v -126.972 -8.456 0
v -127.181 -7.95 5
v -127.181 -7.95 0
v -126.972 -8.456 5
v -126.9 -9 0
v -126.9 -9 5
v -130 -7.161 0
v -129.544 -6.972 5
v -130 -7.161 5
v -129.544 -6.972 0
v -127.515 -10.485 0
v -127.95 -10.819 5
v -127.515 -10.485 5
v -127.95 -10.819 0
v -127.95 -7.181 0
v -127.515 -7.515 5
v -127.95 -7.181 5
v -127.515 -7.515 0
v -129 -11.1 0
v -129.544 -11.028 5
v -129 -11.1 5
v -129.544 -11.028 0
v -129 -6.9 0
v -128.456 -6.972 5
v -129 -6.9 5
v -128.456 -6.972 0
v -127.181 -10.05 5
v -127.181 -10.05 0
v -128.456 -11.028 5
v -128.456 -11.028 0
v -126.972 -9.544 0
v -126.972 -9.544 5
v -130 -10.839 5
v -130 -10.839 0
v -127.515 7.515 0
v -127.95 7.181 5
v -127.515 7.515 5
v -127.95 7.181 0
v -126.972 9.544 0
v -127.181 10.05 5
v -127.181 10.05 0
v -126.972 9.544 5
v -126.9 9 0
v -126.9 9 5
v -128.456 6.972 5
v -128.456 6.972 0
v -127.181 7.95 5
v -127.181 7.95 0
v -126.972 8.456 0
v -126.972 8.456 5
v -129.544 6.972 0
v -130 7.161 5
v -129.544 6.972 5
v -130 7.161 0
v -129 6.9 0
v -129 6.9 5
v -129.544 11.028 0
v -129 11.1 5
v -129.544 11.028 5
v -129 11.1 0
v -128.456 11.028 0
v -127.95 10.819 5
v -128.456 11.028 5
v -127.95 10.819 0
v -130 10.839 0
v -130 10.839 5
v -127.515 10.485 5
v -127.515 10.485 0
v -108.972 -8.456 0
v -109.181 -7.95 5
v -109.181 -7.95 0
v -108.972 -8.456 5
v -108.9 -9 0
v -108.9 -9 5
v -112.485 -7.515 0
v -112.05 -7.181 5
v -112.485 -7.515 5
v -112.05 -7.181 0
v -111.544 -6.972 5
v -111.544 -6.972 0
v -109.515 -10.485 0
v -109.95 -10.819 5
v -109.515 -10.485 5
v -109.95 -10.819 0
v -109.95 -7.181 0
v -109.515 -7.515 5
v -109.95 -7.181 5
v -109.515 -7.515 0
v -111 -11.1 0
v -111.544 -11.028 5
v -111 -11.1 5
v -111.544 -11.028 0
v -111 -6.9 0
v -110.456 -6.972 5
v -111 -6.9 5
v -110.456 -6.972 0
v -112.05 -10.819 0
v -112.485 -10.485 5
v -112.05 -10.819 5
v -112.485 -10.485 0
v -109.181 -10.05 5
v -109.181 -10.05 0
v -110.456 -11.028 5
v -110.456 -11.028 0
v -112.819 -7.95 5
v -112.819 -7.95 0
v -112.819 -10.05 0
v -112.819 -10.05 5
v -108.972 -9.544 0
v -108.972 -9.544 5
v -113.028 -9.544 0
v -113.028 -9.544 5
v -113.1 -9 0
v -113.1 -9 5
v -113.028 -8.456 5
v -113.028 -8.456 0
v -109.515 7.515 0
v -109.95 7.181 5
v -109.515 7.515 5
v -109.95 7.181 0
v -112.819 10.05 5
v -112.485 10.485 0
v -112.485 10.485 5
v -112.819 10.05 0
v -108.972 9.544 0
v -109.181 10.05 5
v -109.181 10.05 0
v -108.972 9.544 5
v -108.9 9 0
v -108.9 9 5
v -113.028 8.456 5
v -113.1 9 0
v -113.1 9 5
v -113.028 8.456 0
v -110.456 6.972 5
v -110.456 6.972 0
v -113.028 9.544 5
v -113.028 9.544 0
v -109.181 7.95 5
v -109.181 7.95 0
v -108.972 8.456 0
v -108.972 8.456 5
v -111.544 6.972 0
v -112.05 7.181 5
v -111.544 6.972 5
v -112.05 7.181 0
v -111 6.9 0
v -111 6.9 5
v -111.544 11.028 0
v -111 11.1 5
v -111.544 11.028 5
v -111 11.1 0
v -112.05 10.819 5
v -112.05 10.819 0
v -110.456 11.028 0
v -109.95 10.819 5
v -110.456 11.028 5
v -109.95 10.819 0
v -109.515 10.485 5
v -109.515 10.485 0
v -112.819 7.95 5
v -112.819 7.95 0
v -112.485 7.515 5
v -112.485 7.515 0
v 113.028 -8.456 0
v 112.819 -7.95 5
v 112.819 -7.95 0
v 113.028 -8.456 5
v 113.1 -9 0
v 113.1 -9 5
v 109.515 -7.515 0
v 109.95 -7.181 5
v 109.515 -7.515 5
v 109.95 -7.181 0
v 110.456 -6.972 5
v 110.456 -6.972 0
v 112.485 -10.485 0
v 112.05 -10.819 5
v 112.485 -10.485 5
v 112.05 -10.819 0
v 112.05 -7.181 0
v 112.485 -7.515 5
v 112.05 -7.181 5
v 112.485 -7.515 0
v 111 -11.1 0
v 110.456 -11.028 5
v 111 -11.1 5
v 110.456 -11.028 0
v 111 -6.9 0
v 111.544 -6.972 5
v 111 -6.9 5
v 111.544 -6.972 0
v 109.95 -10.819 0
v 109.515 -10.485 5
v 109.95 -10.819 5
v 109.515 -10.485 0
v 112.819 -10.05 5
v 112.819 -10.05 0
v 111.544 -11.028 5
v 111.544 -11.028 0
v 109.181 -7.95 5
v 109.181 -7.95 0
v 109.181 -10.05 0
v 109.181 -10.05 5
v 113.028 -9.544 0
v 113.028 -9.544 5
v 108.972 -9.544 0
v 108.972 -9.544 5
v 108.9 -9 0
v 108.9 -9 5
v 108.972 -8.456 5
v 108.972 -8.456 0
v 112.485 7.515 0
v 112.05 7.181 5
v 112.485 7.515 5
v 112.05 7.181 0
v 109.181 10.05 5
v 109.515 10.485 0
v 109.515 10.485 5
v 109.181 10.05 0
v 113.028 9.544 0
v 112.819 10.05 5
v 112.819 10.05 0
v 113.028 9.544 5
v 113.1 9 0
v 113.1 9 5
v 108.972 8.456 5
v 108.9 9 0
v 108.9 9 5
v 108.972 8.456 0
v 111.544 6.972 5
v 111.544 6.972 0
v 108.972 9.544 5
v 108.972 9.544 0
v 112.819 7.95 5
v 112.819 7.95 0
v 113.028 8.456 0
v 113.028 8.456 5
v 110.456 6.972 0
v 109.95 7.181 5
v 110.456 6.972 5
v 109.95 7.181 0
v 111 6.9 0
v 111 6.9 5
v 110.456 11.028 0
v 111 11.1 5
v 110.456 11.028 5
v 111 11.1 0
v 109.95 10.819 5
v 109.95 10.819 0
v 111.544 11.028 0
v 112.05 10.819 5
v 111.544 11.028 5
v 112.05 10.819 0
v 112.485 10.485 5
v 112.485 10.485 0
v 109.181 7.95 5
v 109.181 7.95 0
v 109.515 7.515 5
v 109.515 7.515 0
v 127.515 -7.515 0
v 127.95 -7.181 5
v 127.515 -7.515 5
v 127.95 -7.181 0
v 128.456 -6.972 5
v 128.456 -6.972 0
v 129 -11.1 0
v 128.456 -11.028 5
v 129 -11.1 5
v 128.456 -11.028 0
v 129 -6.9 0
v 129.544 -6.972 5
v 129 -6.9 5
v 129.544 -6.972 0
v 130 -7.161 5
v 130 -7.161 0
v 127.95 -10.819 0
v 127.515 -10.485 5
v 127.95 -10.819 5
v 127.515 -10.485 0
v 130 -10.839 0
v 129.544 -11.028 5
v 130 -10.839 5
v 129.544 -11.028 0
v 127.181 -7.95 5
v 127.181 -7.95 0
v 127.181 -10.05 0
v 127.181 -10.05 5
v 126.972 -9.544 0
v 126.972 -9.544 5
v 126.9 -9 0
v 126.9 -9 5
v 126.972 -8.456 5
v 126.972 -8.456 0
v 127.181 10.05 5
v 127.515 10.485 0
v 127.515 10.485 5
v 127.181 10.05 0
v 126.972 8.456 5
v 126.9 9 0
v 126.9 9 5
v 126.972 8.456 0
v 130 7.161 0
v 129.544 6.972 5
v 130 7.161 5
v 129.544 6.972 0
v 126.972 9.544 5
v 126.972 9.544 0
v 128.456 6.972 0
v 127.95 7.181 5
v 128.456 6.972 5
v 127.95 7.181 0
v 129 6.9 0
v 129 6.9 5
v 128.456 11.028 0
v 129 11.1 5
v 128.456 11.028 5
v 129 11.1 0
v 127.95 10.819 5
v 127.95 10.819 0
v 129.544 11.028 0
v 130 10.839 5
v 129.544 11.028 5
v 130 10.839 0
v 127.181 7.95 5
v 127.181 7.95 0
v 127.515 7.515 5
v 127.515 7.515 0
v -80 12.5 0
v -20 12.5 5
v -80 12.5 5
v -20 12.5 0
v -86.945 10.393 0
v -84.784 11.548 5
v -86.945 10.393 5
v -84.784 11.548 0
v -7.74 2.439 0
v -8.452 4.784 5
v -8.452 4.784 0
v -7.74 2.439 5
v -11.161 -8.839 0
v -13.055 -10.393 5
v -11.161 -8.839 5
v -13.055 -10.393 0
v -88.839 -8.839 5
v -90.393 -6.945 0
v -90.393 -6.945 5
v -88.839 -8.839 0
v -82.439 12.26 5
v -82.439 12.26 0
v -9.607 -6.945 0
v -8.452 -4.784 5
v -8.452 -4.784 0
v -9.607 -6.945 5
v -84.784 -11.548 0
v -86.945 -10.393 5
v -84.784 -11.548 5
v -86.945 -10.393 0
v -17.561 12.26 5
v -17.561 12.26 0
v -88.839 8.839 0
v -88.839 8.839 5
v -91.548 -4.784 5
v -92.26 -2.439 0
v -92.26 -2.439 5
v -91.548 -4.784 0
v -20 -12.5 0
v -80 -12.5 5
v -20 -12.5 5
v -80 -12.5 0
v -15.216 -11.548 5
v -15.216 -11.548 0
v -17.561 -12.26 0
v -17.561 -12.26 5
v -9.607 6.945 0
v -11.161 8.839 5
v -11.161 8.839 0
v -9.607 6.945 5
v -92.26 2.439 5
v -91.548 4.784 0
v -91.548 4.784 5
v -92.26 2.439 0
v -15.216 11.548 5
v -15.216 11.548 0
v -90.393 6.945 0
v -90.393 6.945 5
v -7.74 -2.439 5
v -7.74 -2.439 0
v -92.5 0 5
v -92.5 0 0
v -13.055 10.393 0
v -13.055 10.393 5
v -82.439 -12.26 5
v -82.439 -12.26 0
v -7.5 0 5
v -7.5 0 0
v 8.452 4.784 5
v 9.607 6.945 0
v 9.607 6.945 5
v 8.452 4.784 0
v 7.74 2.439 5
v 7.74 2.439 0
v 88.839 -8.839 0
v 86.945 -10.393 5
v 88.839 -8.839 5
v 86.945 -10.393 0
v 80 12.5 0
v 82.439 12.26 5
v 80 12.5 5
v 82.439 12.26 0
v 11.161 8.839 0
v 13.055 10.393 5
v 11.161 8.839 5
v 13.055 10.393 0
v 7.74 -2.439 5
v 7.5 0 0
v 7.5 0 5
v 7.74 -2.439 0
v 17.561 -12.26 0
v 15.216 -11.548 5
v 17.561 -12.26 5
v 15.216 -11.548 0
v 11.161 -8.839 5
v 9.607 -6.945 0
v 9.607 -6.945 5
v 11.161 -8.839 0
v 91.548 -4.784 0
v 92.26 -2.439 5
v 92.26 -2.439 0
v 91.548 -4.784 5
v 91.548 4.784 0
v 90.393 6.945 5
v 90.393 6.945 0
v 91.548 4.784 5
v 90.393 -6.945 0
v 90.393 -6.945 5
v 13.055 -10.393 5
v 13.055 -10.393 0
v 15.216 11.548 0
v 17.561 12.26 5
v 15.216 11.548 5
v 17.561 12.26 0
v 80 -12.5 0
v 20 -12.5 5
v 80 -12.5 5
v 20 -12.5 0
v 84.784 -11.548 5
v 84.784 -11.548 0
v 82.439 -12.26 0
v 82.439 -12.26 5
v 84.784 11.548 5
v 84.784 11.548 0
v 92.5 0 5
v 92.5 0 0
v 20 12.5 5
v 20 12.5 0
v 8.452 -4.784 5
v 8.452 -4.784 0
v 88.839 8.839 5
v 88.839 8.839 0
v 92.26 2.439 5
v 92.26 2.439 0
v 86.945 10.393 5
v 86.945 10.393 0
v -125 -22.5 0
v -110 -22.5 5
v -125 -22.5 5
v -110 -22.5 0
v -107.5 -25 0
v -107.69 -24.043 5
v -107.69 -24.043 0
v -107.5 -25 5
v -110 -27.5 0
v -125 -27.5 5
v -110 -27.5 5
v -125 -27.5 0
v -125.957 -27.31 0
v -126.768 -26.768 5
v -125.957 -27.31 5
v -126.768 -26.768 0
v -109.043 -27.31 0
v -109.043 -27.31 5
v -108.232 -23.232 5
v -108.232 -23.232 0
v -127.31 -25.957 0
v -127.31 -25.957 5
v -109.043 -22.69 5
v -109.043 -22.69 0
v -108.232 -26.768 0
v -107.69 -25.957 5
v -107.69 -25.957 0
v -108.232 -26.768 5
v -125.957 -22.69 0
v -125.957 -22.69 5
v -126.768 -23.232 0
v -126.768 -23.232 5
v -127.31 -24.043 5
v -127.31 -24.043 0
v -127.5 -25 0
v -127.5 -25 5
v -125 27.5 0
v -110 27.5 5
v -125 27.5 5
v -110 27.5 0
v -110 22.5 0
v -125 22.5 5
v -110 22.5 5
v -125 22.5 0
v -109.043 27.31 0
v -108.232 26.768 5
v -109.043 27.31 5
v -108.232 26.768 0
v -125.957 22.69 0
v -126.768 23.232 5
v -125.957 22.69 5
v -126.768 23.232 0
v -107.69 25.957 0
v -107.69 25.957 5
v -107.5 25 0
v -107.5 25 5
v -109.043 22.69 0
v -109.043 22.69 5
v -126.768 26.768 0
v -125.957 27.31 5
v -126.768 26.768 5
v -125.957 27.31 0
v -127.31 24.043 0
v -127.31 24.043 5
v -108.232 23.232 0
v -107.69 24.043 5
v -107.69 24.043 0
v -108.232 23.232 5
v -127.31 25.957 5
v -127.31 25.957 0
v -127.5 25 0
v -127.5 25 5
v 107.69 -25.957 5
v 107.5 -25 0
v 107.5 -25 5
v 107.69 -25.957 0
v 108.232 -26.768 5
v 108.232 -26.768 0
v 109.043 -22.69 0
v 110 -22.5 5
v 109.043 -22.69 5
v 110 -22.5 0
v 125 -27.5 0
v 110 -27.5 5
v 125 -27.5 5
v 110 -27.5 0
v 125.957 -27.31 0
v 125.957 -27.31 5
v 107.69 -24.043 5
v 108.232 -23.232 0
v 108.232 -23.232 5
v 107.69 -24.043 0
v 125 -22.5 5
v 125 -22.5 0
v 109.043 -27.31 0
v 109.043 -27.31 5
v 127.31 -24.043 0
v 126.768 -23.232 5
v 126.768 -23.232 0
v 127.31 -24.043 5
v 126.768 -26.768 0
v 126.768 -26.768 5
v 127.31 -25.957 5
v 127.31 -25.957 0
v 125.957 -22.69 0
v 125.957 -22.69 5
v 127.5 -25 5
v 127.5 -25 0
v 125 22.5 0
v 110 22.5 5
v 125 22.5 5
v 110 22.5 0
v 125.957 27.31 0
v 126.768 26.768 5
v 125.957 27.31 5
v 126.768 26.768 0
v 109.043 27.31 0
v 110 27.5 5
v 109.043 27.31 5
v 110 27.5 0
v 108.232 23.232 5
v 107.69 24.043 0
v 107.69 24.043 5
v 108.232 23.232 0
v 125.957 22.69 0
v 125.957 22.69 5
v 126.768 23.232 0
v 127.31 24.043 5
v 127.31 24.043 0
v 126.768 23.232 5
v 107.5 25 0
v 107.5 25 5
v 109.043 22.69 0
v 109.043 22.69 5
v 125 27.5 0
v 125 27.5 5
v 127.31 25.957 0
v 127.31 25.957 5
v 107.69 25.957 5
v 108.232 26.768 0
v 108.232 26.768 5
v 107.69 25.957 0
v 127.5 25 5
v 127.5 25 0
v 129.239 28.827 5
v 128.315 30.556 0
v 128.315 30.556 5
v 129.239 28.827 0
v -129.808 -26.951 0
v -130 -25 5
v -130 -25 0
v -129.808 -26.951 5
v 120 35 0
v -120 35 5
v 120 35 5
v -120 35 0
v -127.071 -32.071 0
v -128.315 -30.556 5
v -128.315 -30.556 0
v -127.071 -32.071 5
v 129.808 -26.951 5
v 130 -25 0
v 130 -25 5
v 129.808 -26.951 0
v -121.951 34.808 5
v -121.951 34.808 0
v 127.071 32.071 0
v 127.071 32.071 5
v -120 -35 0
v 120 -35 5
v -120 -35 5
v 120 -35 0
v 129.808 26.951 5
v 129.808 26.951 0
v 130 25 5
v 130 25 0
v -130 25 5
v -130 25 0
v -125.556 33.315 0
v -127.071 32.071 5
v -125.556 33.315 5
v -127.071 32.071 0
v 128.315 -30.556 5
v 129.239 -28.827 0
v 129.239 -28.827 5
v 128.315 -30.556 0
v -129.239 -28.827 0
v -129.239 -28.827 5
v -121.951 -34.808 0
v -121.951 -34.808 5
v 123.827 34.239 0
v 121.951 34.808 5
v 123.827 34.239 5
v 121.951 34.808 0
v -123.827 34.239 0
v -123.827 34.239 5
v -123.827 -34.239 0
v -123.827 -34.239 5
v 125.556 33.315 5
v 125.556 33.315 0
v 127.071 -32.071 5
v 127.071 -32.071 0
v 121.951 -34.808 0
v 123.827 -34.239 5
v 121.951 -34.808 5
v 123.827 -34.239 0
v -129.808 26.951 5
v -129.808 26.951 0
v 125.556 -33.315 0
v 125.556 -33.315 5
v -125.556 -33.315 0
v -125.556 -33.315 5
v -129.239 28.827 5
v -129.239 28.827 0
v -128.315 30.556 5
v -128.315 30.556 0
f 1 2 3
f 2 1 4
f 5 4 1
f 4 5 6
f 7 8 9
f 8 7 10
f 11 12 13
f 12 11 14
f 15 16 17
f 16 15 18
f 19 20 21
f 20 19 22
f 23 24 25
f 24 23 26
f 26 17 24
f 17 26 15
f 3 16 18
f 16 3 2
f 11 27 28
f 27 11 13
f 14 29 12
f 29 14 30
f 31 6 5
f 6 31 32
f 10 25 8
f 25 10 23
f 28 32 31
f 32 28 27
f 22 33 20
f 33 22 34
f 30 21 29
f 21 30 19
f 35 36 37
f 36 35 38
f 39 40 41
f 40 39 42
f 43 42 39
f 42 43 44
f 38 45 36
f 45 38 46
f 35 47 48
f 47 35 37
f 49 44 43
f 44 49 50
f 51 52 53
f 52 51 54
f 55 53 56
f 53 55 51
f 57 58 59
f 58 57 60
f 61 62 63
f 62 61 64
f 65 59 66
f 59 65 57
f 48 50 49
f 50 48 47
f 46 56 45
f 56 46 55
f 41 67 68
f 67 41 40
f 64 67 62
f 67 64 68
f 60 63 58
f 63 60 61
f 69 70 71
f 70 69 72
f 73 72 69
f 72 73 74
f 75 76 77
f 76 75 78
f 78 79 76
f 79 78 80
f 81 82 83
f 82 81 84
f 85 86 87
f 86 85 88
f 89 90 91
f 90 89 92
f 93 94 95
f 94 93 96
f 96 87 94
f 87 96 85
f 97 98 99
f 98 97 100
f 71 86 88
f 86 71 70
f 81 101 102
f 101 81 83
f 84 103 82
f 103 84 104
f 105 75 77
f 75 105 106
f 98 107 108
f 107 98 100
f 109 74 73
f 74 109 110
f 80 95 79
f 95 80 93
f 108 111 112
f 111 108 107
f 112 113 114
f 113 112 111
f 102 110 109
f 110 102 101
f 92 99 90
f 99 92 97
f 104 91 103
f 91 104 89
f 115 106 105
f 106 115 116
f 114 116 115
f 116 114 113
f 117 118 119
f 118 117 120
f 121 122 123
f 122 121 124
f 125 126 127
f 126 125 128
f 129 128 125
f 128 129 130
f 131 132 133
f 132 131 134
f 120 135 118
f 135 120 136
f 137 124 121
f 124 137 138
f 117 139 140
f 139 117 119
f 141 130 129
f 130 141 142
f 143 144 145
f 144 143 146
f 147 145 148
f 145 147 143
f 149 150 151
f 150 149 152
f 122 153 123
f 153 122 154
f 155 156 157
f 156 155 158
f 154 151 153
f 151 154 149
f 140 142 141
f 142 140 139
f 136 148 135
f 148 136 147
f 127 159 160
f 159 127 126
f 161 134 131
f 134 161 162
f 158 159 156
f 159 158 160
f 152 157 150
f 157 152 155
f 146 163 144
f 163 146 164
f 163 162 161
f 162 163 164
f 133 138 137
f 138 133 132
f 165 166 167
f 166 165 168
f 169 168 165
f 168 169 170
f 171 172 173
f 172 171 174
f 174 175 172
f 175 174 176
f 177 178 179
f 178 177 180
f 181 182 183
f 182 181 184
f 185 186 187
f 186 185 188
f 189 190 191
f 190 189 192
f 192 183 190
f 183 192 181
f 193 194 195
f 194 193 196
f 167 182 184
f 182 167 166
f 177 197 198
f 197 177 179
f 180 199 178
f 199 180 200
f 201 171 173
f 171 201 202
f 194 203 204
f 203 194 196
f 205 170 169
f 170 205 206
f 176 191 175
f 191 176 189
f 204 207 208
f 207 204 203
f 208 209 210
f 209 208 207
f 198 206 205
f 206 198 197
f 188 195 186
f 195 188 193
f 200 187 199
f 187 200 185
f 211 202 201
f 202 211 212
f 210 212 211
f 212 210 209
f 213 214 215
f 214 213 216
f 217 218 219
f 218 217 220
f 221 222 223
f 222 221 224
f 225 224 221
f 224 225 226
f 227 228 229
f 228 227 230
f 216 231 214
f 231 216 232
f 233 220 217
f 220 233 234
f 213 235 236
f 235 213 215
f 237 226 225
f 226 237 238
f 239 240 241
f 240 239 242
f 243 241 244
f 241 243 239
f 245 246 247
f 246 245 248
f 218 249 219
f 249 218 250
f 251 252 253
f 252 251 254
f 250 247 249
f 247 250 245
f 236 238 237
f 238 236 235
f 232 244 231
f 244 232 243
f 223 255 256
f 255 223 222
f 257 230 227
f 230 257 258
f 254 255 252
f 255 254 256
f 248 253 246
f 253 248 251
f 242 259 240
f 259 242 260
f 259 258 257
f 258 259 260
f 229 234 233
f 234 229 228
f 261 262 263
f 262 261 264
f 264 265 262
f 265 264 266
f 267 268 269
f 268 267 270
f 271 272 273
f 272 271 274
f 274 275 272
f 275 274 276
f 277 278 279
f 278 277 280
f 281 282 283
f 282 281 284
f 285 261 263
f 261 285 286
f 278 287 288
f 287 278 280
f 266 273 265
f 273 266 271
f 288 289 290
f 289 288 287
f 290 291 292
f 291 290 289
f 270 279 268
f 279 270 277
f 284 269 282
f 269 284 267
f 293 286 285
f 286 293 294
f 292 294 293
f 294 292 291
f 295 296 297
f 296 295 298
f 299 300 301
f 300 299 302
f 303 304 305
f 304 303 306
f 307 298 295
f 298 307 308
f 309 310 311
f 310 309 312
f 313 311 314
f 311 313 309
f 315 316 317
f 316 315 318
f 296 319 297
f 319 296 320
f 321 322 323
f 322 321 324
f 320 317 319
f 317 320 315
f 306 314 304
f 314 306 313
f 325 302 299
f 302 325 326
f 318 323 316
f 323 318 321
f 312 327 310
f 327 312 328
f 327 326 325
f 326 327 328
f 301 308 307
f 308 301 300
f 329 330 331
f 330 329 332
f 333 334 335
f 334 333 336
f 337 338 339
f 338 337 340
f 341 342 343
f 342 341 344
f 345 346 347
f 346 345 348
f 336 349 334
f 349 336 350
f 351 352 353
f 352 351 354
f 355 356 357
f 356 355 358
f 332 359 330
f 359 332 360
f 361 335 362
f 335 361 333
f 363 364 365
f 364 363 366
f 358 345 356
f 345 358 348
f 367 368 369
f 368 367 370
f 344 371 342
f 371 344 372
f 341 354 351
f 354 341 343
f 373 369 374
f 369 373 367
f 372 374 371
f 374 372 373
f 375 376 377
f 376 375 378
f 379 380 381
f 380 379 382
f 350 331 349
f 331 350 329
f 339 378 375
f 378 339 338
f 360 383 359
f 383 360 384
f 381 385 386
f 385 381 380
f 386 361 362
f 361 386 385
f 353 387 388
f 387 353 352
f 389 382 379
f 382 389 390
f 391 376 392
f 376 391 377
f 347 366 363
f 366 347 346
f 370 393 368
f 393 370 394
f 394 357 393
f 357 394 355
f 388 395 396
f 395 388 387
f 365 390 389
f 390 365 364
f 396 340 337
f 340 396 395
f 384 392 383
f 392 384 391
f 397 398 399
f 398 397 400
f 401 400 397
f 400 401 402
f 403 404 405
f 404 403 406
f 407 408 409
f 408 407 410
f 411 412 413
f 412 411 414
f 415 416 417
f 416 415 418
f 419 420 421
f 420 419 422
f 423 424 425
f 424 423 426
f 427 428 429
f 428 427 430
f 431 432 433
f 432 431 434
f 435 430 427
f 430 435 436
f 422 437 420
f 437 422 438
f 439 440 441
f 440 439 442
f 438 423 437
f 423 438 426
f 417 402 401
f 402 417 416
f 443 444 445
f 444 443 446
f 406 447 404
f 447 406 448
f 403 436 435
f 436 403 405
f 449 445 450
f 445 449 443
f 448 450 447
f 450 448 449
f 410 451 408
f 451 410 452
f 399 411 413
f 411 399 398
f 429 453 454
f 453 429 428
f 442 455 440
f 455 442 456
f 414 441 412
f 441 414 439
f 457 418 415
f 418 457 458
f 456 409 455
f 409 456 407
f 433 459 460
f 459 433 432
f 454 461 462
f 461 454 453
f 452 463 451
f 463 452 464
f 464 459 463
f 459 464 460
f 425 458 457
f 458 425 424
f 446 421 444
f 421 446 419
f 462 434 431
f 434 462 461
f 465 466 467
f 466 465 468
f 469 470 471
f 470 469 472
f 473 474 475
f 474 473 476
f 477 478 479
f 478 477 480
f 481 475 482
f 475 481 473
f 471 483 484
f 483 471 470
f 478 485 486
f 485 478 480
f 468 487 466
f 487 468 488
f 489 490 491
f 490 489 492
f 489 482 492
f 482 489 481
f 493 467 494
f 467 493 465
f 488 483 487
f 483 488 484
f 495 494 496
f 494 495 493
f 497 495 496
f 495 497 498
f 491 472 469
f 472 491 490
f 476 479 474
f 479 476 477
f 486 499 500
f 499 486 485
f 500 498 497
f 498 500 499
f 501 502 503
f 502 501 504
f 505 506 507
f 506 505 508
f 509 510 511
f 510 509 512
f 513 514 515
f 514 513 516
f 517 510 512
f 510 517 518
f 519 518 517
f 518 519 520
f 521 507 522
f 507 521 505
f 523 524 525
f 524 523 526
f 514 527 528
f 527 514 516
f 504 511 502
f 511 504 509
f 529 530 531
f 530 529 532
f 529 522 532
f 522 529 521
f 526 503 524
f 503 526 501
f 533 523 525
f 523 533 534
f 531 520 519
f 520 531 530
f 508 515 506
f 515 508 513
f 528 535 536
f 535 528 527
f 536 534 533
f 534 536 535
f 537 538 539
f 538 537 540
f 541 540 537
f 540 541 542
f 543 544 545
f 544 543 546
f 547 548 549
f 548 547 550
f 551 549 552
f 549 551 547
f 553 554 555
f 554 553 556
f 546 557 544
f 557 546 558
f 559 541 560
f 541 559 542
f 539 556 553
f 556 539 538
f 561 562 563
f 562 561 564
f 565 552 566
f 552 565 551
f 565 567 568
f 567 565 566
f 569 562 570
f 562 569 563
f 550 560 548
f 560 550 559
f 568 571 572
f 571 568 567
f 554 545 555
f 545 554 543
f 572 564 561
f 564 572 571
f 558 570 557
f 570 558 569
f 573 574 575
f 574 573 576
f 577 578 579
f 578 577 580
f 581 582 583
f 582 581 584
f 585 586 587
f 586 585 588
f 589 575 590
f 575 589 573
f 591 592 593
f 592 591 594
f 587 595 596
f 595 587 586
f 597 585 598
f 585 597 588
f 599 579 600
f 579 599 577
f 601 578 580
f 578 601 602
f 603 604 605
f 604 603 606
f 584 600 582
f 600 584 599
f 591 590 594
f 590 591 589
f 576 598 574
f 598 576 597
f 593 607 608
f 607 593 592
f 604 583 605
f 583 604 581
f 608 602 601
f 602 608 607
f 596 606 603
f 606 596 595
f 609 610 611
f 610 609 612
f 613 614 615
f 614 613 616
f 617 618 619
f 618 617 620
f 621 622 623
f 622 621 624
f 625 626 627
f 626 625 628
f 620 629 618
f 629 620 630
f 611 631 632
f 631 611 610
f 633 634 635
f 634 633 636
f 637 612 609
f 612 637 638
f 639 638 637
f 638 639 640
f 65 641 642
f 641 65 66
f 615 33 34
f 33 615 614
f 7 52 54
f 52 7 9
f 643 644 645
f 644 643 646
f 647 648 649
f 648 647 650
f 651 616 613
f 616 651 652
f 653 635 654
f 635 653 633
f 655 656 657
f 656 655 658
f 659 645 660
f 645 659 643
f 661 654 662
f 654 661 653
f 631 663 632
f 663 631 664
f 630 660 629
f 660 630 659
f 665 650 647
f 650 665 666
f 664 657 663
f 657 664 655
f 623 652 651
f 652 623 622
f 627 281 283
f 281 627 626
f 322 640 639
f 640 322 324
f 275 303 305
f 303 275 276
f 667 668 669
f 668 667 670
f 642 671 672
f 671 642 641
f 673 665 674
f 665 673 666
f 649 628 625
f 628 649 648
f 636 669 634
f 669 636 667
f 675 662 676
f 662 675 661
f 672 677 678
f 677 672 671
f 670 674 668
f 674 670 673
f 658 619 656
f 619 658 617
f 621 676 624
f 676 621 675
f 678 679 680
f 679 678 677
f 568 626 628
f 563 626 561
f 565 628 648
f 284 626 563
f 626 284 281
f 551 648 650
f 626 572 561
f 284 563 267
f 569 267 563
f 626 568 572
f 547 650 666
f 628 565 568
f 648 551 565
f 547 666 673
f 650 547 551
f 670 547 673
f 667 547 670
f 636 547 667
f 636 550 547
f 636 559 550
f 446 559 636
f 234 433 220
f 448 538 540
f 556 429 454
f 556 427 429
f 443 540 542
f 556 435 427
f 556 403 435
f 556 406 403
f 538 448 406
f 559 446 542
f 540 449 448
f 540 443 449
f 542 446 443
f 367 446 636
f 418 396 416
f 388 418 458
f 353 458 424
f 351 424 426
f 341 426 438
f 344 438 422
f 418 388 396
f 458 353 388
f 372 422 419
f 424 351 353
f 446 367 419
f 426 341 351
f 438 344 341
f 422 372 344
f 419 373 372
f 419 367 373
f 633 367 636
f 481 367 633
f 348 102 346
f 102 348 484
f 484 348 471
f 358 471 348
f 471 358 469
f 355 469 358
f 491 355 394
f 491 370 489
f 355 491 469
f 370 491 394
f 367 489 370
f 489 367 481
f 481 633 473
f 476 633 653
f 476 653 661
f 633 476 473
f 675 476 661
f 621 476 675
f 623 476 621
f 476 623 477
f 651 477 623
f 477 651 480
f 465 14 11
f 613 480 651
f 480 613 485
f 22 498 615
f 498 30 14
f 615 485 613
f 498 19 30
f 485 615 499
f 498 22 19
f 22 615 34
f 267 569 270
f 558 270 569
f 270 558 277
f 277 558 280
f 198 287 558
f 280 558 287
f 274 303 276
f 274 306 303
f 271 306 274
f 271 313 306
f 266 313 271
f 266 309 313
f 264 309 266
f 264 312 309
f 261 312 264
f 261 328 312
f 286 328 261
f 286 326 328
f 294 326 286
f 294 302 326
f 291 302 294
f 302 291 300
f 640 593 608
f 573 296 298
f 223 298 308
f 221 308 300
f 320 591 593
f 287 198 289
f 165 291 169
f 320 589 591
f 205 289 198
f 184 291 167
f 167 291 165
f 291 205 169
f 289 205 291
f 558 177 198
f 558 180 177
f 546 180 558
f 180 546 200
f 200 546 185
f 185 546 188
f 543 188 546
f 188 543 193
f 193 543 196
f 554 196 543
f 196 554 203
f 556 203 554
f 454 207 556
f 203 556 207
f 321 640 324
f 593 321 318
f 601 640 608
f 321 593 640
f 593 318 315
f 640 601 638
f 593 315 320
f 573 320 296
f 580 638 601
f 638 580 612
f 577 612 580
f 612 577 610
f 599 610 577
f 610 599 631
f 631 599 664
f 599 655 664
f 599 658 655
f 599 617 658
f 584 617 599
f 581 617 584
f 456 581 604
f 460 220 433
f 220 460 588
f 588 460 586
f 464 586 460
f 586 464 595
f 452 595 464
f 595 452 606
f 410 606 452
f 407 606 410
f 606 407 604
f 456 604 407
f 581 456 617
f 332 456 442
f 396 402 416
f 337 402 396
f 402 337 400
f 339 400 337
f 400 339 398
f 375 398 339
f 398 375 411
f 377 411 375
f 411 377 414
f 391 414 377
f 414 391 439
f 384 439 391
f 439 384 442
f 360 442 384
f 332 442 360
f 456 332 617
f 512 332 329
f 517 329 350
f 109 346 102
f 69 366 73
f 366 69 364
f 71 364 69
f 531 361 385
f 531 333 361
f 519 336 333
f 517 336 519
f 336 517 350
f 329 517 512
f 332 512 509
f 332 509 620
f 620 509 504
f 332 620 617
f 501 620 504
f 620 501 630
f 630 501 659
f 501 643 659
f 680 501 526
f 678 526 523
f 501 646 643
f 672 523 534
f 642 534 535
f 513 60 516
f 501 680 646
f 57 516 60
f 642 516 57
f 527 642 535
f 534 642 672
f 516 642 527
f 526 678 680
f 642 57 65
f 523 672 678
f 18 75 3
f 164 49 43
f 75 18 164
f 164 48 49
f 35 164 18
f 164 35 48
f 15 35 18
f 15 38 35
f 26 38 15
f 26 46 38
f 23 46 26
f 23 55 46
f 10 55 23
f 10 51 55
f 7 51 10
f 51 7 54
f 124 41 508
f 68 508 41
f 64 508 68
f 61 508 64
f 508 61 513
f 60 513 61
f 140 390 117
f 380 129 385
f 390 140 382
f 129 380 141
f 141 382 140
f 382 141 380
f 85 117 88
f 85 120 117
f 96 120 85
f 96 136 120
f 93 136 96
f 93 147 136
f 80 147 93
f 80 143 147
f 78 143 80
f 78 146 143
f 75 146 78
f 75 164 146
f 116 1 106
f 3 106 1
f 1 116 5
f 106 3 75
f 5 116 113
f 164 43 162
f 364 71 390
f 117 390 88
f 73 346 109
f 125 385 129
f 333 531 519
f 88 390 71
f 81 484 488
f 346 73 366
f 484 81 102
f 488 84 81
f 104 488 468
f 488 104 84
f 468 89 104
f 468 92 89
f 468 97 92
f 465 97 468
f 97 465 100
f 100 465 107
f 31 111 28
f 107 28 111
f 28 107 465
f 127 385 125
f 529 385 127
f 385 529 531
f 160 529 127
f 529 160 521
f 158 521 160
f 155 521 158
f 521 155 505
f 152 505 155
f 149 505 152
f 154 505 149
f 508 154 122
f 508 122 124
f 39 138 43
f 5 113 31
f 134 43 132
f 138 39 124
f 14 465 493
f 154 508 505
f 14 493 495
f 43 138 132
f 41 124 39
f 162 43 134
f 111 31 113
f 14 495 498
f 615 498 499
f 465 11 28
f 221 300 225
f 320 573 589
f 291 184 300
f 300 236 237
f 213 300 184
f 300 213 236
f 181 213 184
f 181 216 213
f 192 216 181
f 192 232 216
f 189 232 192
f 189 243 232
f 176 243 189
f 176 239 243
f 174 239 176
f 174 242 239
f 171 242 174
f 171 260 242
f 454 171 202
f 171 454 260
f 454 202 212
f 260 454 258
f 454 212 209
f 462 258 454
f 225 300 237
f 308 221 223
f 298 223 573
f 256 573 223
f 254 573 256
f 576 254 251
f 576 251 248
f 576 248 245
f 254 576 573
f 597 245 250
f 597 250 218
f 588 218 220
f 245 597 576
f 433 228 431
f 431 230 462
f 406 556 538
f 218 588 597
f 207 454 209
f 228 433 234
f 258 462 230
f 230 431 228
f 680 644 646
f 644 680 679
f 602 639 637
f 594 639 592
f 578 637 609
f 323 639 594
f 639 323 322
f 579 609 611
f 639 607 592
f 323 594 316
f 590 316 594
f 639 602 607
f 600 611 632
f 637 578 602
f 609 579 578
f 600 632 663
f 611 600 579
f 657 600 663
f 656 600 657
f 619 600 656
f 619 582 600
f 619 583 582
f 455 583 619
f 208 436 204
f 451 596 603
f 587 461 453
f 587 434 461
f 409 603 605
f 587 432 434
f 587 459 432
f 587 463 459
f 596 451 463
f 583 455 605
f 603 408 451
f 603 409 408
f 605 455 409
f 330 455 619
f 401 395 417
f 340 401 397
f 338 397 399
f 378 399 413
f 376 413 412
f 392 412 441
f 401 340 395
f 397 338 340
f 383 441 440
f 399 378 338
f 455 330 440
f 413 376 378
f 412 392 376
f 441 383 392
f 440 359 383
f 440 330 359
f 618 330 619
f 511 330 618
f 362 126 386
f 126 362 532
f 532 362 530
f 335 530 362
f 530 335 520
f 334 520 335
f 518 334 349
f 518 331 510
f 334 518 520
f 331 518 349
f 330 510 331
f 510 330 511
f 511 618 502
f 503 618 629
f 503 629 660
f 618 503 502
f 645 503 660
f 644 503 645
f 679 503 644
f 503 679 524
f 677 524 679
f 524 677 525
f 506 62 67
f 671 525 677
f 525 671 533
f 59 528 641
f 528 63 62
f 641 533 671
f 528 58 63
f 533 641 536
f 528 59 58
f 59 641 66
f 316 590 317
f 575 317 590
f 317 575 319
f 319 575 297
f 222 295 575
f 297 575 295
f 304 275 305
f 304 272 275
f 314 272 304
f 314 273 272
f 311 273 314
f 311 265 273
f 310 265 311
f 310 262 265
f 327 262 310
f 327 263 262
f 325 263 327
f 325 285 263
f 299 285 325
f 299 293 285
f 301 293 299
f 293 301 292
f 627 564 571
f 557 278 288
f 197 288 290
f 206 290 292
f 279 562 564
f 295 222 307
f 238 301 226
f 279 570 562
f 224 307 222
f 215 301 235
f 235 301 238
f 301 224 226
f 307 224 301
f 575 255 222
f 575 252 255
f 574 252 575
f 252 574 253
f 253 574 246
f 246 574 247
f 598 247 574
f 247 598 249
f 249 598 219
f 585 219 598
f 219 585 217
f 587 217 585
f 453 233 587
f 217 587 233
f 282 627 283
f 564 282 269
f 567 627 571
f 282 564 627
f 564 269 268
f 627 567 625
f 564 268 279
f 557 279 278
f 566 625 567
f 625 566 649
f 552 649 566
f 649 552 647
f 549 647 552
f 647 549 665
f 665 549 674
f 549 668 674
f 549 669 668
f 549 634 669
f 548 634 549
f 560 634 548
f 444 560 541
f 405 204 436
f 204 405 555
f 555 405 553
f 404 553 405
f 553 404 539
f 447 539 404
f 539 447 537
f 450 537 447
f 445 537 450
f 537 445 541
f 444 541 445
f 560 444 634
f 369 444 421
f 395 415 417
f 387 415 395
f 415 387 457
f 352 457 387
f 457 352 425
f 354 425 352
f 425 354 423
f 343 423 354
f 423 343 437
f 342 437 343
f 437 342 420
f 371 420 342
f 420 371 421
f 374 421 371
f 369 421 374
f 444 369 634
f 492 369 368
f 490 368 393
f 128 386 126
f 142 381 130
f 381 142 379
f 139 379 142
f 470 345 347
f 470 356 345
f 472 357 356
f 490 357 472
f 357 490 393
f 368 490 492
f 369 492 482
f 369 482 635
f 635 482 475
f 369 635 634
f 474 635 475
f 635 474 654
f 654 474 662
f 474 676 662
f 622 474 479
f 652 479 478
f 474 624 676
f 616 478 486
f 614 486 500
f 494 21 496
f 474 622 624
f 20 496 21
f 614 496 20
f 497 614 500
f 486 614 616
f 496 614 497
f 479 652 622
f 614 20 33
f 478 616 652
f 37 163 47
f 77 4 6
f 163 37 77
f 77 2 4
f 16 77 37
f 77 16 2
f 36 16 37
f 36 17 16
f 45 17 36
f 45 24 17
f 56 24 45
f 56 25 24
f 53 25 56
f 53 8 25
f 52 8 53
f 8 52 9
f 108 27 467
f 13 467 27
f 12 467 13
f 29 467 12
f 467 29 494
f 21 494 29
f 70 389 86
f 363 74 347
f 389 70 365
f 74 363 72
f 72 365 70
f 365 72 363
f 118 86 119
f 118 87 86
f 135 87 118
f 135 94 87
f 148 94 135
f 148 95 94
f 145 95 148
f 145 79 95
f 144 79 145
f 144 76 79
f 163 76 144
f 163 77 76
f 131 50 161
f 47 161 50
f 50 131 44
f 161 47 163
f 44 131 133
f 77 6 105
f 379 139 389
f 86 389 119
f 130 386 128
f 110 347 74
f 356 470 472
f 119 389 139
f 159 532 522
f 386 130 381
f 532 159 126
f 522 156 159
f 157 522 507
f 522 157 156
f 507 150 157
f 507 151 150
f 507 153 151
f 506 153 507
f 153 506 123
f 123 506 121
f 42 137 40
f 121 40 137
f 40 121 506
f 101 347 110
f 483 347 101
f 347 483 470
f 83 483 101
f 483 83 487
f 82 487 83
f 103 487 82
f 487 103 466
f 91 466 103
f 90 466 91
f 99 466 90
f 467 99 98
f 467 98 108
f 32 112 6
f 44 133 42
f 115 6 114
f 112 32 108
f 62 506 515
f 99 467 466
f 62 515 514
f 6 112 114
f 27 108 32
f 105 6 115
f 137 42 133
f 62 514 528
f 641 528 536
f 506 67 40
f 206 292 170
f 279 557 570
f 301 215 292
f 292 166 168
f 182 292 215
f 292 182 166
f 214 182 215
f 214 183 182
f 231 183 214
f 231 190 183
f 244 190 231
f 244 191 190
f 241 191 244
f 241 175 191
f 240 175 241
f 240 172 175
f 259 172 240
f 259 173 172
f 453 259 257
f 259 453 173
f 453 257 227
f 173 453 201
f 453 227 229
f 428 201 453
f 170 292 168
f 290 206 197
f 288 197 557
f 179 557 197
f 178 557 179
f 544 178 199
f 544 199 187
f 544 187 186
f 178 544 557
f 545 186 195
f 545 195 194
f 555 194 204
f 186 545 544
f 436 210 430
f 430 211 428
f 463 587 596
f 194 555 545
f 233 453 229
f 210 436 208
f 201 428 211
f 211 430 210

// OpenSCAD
// file: ../common.scad
/*
 * WAVE OCEAN V10 - TWISTED CAM SYSTEM
 * COMMON PARAMETERS
 *
 * Simplified mechanism: slats rest on cam surface, no follower arms
 * Single helical ridge creates traveling wave as cam rotates
 *
 * All dimensions in mm
 */

// ============================================
// PRINT TOLERANCES (tune for your printer)
// ============================================

TOL_CLEARANCE = 0.2;         // Shaft in hole clearance
TOL_PRESS_FIT = -0.15;       // Bearing press-fit interference
TOL_SLIDING = 0.3;           // Sliding fit (slats in guides)

// ============================================
// HARDWARE - BEARINGS
// ============================================

// 608 bearing (main shaft) - common, cheap
BEARING_608_ID = 8;
BEARING_608_OD = 22;
BEARING_608_H = 7;

// ============================================
// HARDWARE - FASTENERS
// ============================================

M3_HOLE = 3.2;
M3_HEAD_DIA = 5.5;
M3_HEAD_H = 3;
M4_HOLE = 4.2;

// ============================================
// MAIN SHAFT
// ============================================

SHAFT_DIA = 8;                   // 8mm steel rod
SHAFT_LENGTH = 260;              // Total shaft length
SHAFT_HOLE = SHAFT_DIA + TOL_CLEARANCE;  // 8.2mm

// ============================================
// TWISTED CAM DIMENSIONS
// ============================================

CAM_LENGTH = 200;                // Active wave zone
CAM_CORE_RADIUS = 12;            // Base cylinder radius
CAM_RIDGE_HEIGHT = 10;           // How much ridge sticks out
CAM_RIDGE_WIDTH = 8;             // Width of ridge (smoothness)
CAM_MAX_RADIUS = CAM_CORE_RADIUS + CAM_RIDGE_HEIGHT;  // 22mm

// Helix parameters
HELIX_TURNS = 2;                 // Number of complete spirals
HELIX_PITCH = CAM_LENGTH / HELIX_TURNS;  // 100mm per turn

// ============================================
// SLAT DIMENSIONS
// ============================================

NUM_SLATS = 24;
SLAT_SPACING = CAM_LENGTH / NUM_SLATS;  // 8.33mm

SLAT_WIDTH = 6;                  // X dimension (along cam axis)
SLAT_DEPTH = 30;                 // Y dimension (front to back)
SLAT_HEIGHT = 50;                // Z dimension (wave visual height)

// Slat bottom - curved to nest on cam surface
SLAT_CURVE_RADIUS = CAM_CORE_RADIUS + 2;  // Slightly larger than core

// Wave motion
WAVE_AMPLITUDE = CAM_RIDGE_HEIGHT;  // Total Z travel = ridge height

// ============================================
// GUIDE RAIL DIMENSIONS
// ============================================

// Minimal guides - thin vertical slots, barely visible
GUIDE_LENGTH = CAM_LENGTH + 20;  // 220mm
GUIDE_HEIGHT = WAVE_AMPLITUDE + SLAT_HEIGHT + 10;  // 70mm
GUIDE_THICKNESS = 3;             // Very thin - minimal visual impact
GUIDE_WALL = 2;

SLOT_WIDTH = SLAT_WIDTH + TOL_SLIDING;  // 6.3mm
SLOT_HEIGHT = WAVE_AMPLITUDE + 15;       // 25mm vertical travel

// ============================================
// BEARING BLOCK DIMENSIONS
// ============================================

BB_WIDTH = 30;
BB_DEPTH = 30;
BB_HEIGHT = CAM_MAX_RADIUS + 8;  // 30mm - cam clears base

BEARING_POCKET_DIA = BEARING_608_OD - TOL_PRESS_FIT;  // 22.15mm press fit
BEARING_POCKET_DEPTH = BEARING_608_H + 0.5;           // 7.5mm

// ============================================
// BASE PLATE DIMENSIONS
// ============================================

BASE_LENGTH = CAM_LENGTH + 60;   // 260mm
BASE_WIDTH = SLAT_DEPTH + 40;    // 70mm
BASE_THICKNESS = 5;

// ============================================
// ASSEMBLY POSITIONS
// ============================================

// Cam center Z (shaft axis height above base)
CAM_CENTER_Z = BASE_THICKNESS + BB_HEIGHT;  // 35mm

// Bearing blocks X positions
BB_LEFT_X = -CAM_LENGTH/2 - BB_WIDTH/2 - 5;   // -120mm
BB_RIGHT_X = CAM_LENGTH/2 + BB_WIDTH/2 + 5;   // +120mm

// Guide rails Y positions (front and back of slats)
GUIDE_FRONT_Y = -SLAT_DEPTH/2 - GUIDE_THICKNESS - 1;  // -17mm
GUIDE_BACK_Y = SLAT_DEPTH/2 + 1;                       // +16mm

// Guide rails Z position (bottom of guide)
GUIDE_Z = CAM_CENTER_Z + CAM_MAX_RADIUS - 5;  // 52mm

// ============================================
// COLORS
// ============================================

C_CAM = [0.7, 0.5, 0.25];        // Wood brown
C_SLAT = [0.15, 0.35, 0.6];      // Ocean blue
C_GUIDE = [0.3, 0.3, 0.35, 0.5]; // Dark gray, semi-transparent
C_BB = [0.35, 0.35, 0.4];        // Bearing block gray
C_BASE = [0.25, 0.25, 0.3];      // Dark base
C_SHAFT = [0.6, 0.6, 0.65];      // Steel

// ============================================
// HELPER FUNCTIONS
// ============================================

// Helix phase at position X along cam (0-360 per turn)
function helix_phase(x) = ((x + CAM_LENGTH/2) / CAM_LENGTH) * 360 * HELIX_TURNS;

// Cam surface height at position X, given cam rotation angle theta
// Returns how far the ridge sticks up at that X position
function ridge_height(x, theta) =
    let(phase = helix_phase(x) + theta)
    let(ridge = CAM_RIDGE_HEIGHT * max(0, cos(phase - 90)))
    ridge;

// Total cam radius at position X, angle theta
function cam_radius(x, theta) = CAM_CORE_RADIUS + ridge_height(x, theta);

// Slat X position (evenly spaced)
function slat_x(i) = i * SLAT_SPACING - CAM_LENGTH/2 + SLAT_SPACING/2;

// Slat Z position (bottom of slat rests on cam surface)
function slat_z(i, theta) =
    let(x = slat_x(i))
    CAM_CENTER_Z + cam_radius(x, theta);

// ============================================
// QUALITY
// ============================================

$fn = 48;

// ============================================
// VERIFICATION
// ============================================

echo("=== TWISTED CAM SYSTEM ===");
echo(str("Cam length: ", CAM_LENGTH, "mm"));
echo(str("Cam radius: ", CAM_CORE_RADIUS, "-", CAM_MAX_RADIUS, "mm"));
echo(str("Ridge height (wave amplitude): ", CAM_RIDGE_HEIGHT, "mm"));
echo(str("Helix turns: ", HELIX_TURNS));
echo(str("Slats: ", NUM_SLATS, " @ ", SLAT_SPACING, "mm spacing"));
echo(str("Slat gap: ", SLAT_SPACING - SLAT_WIDTH, "mm"));
// main file
/*
 * BASE PLATE - Main Foundation
 *
 * Printable part: 1x (or 2x halves if bed < 260mm)
 * Print orientation: Flat (Z up)
 *
 * Features:
 * - Mounting holes for bearing blocks
 * - Slots for optional frame attachment
 * - Can be split into 2 halves for smaller printers
 */

include <../common.scad>

$fn = 32;

// ============================================
// CONFIGURATION
// ============================================

SPLIT_BASE = false;  // Set true to create 2 halves

// ============================================
// MAIN BASE PLATE MODULE
// ============================================

module base_plate() {
    if (SPLIT_BASE) {
        base_half();
    } else {
        base_full();
    }
}

module base_full() {
    difference() {
        // Main plate
        plate_body();

        // Bearing block mounting holes
        bearing_block_holes();

        // Weight reduction cutouts
        weight_cutouts();

        // Frame mounting slots
        frame_slots();
    }
}

module base_half() {
    // Left or right half for smaller printers
    difference() {
        base_full();

        // Cut off right half
        translate([0, -BASE_WIDTH, -1])
            cube([BASE_LENGTH, BASE_WIDTH * 2, BASE_THICKNESS + 2]);
    }
}

// ============================================
// PLATE BODY
// ============================================

module plate_body() {
    // Rounded rectangle base
    hull() {
        for (x = [-1, 1]) {
            for (y = [-1, 1]) {
                translate([x * (BASE_LENGTH/2 - 10), y * (BASE_WIDTH/2 - 10), 0])
                    cylinder(r = 10, h = BASE_THICKNESS);
            }
        }
    }
}

// ============================================
// BEARING BLOCK MOUNTING HOLES
// ============================================

module bearing_block_holes() {
    hole_spacing = 18;

    for (x_pos = [BB_LEFT_X, BB_RIGHT_X]) {
        for (x_off = [-1, 1]) {
            for (y_off = [-1, 1]) {
                translate([x_pos + x_off * hole_spacing/2,
                          y_off * hole_spacing/2,
                          -1])
                    cylinder(d = M4_HOLE, h = BASE_THICKNESS + 2, $fn = 24);
            }
        }
    }
}

// ============================================
// WEIGHT REDUCTION
// ============================================

module weight_cutouts() {
    // Oval cutouts between bearing blocks
    cutout_length = 60;
    cutout_width = 25;

    for (x = [-50, 50]) {
        translate([x, 0, -1])
        hull() {
            translate([-cutout_length/2, 0, 0])
                cylinder(d = cutout_width, h = BASE_THICKNESS + 2, $fn = 32);
            translate([cutout_length/2, 0, 0])
                cylinder(d = cutout_width, h = BASE_THICKNESS + 2, $fn = 32);
        }
    }
}

// ============================================
// FRAME MOUNTING SLOTS
// ============================================

module frame_slots() {
    // Slots at corners for mounting to external frame/canvas
    slot_length = 15;
    slot_width = 5;

    for (x_sign = [-1, 1]) {
        for (y_sign = [-1, 1]) {
            translate([x_sign * (BASE_LENGTH/2 - 20),
                      y_sign * (BASE_WIDTH/2 - 10),
                      -1])
            hull() {
                cylinder(d = slot_width, h = BASE_THICKNESS + 2, $fn = 16);
                translate([x_sign * slot_length, 0, 0])
                    cylinder(d = slot_width, h = BASE_THICKNESS + 2, $fn = 16);
            }
        }
    }
}

// ============================================
// RENDER
// ============================================

color(C_BASE)
base_plate();

// ============================================
// INFO
// ============================================

echo("=== BASE PLATE ===");
echo(str("Size: ", BASE_LENGTH, " x ", BASE_WIDTH, " x ", BASE_THICKNESS, "mm"));
echo("");
if (SPLIT_BASE) {
    echo("Print: 2x halves (set SPLIT_BASE = true)");
} else {
    echo("Print: 1x full (requires 260mm bed)");
    echo("Set SPLIT_BASE = true for smaller printers");
}
echo("Orientation: Flat (Z up)");
echo("Material: PLA or PETG");
